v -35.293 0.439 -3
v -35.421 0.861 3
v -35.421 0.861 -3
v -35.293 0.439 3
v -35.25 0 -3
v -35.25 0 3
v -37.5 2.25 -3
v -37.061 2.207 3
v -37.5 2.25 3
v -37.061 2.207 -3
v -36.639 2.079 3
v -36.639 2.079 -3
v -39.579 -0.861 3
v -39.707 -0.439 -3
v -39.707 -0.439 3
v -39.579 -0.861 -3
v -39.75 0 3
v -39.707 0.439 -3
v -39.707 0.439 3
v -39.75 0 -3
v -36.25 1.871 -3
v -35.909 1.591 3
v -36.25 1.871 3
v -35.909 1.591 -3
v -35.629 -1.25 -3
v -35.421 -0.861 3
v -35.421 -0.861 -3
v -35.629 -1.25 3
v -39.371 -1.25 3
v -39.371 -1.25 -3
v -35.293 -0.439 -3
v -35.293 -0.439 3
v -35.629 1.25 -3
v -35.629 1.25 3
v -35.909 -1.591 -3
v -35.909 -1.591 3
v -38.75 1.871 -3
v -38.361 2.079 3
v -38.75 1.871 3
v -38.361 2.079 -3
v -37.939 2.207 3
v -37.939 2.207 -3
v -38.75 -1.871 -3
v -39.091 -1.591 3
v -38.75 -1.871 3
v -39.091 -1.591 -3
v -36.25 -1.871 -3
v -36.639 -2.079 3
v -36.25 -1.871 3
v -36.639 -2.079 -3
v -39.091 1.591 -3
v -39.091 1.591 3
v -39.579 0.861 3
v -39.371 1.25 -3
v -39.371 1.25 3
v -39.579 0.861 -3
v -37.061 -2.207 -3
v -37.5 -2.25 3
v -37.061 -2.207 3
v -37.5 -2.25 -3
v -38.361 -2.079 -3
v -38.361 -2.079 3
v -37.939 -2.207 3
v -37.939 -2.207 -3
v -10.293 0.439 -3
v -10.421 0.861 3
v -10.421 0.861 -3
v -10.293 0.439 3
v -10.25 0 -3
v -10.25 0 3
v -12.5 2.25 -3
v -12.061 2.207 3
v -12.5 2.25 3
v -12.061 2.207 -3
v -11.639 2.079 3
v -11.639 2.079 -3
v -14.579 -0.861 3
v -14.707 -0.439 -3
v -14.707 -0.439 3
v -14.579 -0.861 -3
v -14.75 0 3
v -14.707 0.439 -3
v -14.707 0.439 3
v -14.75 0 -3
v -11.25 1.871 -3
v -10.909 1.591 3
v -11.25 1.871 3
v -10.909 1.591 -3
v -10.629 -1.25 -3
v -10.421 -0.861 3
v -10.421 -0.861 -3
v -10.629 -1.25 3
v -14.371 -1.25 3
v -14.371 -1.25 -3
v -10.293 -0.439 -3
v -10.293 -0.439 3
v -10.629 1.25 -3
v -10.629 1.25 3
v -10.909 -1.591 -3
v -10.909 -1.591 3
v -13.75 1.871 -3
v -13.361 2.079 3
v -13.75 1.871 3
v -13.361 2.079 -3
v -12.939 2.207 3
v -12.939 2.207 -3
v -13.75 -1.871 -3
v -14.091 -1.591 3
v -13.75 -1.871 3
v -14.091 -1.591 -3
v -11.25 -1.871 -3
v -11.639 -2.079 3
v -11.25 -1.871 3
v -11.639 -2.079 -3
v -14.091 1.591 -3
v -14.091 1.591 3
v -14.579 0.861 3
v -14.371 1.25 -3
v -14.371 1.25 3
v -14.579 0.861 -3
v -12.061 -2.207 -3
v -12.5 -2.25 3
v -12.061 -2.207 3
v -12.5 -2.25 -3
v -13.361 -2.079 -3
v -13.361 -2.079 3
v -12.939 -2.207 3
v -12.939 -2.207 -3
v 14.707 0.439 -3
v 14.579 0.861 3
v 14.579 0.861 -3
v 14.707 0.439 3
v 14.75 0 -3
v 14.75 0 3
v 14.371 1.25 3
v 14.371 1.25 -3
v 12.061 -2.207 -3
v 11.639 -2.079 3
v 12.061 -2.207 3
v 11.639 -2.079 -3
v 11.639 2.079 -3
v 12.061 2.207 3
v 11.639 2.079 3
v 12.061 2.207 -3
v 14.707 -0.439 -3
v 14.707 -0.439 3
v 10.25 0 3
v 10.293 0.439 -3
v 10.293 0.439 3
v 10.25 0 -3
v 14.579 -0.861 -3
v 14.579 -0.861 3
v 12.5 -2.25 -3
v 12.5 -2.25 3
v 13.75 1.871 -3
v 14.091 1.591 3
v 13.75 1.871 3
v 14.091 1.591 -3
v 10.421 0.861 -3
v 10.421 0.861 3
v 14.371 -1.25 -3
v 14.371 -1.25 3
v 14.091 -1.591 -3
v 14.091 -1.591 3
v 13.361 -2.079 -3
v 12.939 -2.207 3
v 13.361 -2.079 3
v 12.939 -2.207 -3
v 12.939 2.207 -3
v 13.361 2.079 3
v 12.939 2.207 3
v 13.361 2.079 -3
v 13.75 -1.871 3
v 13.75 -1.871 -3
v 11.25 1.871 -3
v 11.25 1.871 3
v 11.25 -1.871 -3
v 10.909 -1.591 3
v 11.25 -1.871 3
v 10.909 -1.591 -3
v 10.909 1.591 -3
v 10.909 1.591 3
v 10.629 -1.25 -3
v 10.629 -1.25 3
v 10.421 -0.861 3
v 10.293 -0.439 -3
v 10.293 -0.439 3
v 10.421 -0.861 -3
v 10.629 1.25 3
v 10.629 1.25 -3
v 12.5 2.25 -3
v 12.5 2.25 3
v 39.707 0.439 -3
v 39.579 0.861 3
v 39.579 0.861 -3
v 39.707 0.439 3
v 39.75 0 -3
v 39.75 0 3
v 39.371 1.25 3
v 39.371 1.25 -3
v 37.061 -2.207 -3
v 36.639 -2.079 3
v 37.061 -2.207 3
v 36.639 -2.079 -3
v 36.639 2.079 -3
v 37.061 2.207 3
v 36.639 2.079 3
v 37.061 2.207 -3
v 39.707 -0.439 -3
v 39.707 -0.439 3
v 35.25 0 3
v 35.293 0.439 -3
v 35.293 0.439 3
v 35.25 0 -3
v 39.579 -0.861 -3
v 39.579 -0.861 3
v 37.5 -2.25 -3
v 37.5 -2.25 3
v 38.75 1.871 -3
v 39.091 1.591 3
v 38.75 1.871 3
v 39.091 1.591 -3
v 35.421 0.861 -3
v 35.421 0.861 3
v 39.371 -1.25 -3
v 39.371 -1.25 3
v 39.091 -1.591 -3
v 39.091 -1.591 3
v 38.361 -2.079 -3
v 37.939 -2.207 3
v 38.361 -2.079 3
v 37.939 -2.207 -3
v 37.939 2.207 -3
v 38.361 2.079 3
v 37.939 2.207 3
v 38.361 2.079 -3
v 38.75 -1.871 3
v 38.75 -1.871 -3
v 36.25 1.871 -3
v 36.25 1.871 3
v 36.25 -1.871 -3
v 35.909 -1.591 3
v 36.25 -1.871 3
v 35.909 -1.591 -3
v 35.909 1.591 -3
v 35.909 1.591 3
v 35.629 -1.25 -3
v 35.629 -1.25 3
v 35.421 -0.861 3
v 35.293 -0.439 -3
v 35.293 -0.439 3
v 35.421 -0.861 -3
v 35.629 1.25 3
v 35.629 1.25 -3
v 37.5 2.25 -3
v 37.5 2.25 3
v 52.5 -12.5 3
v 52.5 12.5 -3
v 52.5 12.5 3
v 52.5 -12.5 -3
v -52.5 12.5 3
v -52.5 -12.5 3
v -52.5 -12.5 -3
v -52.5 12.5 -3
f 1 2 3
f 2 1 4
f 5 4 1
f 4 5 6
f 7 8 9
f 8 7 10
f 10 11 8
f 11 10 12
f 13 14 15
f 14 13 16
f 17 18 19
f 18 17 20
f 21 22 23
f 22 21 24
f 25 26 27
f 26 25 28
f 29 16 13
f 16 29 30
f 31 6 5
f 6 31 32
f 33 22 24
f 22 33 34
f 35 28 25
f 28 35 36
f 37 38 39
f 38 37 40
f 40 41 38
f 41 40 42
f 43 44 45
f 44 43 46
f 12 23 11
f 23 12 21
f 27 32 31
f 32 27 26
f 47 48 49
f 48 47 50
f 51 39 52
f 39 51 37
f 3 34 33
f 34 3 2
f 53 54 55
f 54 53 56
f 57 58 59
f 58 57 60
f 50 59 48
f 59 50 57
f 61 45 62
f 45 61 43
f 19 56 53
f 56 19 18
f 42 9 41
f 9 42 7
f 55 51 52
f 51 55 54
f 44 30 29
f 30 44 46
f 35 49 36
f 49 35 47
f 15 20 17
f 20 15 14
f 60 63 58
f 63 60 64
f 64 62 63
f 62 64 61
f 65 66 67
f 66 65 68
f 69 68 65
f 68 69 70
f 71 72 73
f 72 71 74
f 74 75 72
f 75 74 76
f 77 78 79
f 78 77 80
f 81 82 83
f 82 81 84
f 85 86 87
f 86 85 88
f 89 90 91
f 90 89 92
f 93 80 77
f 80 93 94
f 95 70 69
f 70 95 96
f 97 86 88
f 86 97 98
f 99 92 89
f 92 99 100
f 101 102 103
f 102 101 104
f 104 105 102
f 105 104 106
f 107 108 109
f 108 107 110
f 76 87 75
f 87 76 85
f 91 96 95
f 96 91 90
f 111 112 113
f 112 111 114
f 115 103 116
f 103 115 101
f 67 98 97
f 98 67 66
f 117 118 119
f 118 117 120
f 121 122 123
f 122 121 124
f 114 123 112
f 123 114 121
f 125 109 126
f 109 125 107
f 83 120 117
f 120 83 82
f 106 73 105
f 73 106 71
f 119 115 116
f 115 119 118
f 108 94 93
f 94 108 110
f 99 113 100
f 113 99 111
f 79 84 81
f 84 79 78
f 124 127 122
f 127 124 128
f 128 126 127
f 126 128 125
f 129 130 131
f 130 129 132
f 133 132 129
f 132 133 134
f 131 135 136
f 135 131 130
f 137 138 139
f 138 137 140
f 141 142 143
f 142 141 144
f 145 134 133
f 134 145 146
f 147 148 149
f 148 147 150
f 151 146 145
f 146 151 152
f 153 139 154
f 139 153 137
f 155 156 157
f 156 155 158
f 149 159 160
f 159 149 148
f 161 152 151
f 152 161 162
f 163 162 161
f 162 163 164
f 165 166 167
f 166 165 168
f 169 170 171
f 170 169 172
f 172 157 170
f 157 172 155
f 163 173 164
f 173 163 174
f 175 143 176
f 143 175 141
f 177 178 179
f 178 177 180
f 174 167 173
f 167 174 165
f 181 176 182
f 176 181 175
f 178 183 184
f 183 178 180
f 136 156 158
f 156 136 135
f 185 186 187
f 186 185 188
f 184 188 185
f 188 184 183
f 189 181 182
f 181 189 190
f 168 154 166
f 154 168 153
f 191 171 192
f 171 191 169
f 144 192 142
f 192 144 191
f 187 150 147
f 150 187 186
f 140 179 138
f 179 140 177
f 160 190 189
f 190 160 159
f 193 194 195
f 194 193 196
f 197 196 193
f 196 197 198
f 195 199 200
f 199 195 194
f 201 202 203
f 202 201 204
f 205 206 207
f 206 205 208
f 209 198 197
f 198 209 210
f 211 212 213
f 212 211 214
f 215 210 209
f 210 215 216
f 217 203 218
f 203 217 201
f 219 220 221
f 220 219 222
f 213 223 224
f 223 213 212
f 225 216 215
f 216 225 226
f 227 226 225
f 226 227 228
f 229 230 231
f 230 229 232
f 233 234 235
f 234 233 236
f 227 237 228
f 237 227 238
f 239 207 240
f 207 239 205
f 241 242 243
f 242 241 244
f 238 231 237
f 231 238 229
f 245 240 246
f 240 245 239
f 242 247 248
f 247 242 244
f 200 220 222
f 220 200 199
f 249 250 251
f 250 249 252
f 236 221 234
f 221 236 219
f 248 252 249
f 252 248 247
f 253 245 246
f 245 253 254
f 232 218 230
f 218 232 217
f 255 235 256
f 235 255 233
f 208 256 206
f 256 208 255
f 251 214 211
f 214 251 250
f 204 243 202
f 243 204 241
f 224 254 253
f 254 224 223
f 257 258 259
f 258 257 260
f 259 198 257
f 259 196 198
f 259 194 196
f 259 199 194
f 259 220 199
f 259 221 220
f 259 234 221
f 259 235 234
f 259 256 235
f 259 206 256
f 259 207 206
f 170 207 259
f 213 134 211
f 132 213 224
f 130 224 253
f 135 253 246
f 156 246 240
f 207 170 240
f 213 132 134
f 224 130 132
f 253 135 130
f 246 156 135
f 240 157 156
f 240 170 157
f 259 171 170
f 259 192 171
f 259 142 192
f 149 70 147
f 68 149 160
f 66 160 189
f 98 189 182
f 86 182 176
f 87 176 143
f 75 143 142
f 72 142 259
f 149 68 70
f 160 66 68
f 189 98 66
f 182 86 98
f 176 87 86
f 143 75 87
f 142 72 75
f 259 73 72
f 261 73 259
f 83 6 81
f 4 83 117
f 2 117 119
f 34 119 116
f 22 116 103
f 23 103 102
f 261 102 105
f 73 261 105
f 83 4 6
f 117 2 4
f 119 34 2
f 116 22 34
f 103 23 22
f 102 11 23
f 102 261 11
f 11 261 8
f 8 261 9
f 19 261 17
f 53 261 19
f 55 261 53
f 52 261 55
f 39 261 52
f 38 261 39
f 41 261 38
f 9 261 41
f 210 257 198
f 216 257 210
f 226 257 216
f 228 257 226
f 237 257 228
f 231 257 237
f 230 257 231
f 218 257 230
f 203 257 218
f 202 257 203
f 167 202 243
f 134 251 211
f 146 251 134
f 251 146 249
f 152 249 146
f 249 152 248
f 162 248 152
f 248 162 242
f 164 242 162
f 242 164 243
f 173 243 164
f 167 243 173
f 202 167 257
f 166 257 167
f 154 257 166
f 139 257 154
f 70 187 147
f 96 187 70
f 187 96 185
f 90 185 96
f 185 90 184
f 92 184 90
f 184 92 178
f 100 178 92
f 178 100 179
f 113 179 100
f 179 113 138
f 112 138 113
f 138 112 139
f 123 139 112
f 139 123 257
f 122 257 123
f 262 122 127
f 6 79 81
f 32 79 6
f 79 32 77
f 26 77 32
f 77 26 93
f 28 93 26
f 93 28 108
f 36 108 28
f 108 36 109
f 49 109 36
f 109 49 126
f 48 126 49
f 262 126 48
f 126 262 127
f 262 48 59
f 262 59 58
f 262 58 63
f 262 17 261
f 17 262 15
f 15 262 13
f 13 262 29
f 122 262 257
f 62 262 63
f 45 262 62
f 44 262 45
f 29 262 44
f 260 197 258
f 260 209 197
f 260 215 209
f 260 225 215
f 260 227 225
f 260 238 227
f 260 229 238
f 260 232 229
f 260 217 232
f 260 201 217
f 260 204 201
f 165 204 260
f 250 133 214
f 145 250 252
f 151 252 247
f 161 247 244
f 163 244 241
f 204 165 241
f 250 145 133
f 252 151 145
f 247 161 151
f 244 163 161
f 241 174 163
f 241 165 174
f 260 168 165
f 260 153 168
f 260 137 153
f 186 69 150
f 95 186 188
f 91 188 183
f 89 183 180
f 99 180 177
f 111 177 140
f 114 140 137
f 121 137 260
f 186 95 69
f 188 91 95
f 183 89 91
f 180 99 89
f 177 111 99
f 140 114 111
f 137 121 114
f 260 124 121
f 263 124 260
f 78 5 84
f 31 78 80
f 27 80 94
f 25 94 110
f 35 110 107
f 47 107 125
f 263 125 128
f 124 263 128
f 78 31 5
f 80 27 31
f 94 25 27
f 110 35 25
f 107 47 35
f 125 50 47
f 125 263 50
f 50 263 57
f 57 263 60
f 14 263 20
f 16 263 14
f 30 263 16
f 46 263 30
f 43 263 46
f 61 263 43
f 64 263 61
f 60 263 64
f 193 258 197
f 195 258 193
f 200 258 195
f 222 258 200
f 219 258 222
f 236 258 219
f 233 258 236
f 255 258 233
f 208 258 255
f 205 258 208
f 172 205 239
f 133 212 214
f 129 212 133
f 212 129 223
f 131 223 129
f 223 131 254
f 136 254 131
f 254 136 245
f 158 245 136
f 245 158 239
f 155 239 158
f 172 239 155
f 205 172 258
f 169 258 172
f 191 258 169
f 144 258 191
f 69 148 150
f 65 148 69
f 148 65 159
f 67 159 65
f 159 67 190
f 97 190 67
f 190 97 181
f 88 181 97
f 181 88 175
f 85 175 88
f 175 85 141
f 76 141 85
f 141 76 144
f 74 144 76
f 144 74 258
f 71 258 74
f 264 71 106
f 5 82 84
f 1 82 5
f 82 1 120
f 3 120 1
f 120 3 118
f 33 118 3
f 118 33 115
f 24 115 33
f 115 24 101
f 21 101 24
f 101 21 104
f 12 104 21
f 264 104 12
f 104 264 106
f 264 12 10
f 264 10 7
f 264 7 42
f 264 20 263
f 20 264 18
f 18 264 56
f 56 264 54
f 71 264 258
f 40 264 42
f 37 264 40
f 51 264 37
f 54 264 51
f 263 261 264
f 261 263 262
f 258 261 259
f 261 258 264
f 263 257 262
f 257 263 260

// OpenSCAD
$fn = 32;

// ----------------------------------------------------------------------
// Hole bar, 4 x Ø4.5
// skip layout, 15 mm edge offset
// ----------------------------------------------------------------------

// --- parameters (mm) ---
bar_w = 25;         // bar width (Y)
bar_t = 6;          // bar thickness (Z)
holes = 4;          // holes per row
hole_d = 4.5;       // hole diameter
edge = 15;          // offset from the bar end to the first hole
grid_pitch = 12.5;  // grid the bar was laid out on

// --- derived feature positions (mm) ---
pitch = grid_pitch * 2;       // = 25   holes sit every other grid slot
span = (holes - 1) * pitch;   // = 75   distance between the end holes
bar_l = span + 2 * edge;      // = 105   overall bar length
start_x = -bar_l / 2 + edge;  // = -37.5   X of the first hole
feature_centers = [
  [start_x + 0 * pitch, 0],
  [start_x + 1 * pitch, 0],
  [start_x + 2 * pitch, 0],
  [start_x + 3 * pitch, 0]
];   // hole centres of the first row

// bar with one row of holes, drilled from feature_centers
difference() {
  translate([-bar_l / 2, -bar_w / 2, -bar_t / 2]) cube([bar_l, bar_w, bar_t]);
  for (centre = feature_centers)
    translate([centre[0], centre[1], 0])
      cylinder(d = hole_d, h = bar_t + 2, center = true);
}
